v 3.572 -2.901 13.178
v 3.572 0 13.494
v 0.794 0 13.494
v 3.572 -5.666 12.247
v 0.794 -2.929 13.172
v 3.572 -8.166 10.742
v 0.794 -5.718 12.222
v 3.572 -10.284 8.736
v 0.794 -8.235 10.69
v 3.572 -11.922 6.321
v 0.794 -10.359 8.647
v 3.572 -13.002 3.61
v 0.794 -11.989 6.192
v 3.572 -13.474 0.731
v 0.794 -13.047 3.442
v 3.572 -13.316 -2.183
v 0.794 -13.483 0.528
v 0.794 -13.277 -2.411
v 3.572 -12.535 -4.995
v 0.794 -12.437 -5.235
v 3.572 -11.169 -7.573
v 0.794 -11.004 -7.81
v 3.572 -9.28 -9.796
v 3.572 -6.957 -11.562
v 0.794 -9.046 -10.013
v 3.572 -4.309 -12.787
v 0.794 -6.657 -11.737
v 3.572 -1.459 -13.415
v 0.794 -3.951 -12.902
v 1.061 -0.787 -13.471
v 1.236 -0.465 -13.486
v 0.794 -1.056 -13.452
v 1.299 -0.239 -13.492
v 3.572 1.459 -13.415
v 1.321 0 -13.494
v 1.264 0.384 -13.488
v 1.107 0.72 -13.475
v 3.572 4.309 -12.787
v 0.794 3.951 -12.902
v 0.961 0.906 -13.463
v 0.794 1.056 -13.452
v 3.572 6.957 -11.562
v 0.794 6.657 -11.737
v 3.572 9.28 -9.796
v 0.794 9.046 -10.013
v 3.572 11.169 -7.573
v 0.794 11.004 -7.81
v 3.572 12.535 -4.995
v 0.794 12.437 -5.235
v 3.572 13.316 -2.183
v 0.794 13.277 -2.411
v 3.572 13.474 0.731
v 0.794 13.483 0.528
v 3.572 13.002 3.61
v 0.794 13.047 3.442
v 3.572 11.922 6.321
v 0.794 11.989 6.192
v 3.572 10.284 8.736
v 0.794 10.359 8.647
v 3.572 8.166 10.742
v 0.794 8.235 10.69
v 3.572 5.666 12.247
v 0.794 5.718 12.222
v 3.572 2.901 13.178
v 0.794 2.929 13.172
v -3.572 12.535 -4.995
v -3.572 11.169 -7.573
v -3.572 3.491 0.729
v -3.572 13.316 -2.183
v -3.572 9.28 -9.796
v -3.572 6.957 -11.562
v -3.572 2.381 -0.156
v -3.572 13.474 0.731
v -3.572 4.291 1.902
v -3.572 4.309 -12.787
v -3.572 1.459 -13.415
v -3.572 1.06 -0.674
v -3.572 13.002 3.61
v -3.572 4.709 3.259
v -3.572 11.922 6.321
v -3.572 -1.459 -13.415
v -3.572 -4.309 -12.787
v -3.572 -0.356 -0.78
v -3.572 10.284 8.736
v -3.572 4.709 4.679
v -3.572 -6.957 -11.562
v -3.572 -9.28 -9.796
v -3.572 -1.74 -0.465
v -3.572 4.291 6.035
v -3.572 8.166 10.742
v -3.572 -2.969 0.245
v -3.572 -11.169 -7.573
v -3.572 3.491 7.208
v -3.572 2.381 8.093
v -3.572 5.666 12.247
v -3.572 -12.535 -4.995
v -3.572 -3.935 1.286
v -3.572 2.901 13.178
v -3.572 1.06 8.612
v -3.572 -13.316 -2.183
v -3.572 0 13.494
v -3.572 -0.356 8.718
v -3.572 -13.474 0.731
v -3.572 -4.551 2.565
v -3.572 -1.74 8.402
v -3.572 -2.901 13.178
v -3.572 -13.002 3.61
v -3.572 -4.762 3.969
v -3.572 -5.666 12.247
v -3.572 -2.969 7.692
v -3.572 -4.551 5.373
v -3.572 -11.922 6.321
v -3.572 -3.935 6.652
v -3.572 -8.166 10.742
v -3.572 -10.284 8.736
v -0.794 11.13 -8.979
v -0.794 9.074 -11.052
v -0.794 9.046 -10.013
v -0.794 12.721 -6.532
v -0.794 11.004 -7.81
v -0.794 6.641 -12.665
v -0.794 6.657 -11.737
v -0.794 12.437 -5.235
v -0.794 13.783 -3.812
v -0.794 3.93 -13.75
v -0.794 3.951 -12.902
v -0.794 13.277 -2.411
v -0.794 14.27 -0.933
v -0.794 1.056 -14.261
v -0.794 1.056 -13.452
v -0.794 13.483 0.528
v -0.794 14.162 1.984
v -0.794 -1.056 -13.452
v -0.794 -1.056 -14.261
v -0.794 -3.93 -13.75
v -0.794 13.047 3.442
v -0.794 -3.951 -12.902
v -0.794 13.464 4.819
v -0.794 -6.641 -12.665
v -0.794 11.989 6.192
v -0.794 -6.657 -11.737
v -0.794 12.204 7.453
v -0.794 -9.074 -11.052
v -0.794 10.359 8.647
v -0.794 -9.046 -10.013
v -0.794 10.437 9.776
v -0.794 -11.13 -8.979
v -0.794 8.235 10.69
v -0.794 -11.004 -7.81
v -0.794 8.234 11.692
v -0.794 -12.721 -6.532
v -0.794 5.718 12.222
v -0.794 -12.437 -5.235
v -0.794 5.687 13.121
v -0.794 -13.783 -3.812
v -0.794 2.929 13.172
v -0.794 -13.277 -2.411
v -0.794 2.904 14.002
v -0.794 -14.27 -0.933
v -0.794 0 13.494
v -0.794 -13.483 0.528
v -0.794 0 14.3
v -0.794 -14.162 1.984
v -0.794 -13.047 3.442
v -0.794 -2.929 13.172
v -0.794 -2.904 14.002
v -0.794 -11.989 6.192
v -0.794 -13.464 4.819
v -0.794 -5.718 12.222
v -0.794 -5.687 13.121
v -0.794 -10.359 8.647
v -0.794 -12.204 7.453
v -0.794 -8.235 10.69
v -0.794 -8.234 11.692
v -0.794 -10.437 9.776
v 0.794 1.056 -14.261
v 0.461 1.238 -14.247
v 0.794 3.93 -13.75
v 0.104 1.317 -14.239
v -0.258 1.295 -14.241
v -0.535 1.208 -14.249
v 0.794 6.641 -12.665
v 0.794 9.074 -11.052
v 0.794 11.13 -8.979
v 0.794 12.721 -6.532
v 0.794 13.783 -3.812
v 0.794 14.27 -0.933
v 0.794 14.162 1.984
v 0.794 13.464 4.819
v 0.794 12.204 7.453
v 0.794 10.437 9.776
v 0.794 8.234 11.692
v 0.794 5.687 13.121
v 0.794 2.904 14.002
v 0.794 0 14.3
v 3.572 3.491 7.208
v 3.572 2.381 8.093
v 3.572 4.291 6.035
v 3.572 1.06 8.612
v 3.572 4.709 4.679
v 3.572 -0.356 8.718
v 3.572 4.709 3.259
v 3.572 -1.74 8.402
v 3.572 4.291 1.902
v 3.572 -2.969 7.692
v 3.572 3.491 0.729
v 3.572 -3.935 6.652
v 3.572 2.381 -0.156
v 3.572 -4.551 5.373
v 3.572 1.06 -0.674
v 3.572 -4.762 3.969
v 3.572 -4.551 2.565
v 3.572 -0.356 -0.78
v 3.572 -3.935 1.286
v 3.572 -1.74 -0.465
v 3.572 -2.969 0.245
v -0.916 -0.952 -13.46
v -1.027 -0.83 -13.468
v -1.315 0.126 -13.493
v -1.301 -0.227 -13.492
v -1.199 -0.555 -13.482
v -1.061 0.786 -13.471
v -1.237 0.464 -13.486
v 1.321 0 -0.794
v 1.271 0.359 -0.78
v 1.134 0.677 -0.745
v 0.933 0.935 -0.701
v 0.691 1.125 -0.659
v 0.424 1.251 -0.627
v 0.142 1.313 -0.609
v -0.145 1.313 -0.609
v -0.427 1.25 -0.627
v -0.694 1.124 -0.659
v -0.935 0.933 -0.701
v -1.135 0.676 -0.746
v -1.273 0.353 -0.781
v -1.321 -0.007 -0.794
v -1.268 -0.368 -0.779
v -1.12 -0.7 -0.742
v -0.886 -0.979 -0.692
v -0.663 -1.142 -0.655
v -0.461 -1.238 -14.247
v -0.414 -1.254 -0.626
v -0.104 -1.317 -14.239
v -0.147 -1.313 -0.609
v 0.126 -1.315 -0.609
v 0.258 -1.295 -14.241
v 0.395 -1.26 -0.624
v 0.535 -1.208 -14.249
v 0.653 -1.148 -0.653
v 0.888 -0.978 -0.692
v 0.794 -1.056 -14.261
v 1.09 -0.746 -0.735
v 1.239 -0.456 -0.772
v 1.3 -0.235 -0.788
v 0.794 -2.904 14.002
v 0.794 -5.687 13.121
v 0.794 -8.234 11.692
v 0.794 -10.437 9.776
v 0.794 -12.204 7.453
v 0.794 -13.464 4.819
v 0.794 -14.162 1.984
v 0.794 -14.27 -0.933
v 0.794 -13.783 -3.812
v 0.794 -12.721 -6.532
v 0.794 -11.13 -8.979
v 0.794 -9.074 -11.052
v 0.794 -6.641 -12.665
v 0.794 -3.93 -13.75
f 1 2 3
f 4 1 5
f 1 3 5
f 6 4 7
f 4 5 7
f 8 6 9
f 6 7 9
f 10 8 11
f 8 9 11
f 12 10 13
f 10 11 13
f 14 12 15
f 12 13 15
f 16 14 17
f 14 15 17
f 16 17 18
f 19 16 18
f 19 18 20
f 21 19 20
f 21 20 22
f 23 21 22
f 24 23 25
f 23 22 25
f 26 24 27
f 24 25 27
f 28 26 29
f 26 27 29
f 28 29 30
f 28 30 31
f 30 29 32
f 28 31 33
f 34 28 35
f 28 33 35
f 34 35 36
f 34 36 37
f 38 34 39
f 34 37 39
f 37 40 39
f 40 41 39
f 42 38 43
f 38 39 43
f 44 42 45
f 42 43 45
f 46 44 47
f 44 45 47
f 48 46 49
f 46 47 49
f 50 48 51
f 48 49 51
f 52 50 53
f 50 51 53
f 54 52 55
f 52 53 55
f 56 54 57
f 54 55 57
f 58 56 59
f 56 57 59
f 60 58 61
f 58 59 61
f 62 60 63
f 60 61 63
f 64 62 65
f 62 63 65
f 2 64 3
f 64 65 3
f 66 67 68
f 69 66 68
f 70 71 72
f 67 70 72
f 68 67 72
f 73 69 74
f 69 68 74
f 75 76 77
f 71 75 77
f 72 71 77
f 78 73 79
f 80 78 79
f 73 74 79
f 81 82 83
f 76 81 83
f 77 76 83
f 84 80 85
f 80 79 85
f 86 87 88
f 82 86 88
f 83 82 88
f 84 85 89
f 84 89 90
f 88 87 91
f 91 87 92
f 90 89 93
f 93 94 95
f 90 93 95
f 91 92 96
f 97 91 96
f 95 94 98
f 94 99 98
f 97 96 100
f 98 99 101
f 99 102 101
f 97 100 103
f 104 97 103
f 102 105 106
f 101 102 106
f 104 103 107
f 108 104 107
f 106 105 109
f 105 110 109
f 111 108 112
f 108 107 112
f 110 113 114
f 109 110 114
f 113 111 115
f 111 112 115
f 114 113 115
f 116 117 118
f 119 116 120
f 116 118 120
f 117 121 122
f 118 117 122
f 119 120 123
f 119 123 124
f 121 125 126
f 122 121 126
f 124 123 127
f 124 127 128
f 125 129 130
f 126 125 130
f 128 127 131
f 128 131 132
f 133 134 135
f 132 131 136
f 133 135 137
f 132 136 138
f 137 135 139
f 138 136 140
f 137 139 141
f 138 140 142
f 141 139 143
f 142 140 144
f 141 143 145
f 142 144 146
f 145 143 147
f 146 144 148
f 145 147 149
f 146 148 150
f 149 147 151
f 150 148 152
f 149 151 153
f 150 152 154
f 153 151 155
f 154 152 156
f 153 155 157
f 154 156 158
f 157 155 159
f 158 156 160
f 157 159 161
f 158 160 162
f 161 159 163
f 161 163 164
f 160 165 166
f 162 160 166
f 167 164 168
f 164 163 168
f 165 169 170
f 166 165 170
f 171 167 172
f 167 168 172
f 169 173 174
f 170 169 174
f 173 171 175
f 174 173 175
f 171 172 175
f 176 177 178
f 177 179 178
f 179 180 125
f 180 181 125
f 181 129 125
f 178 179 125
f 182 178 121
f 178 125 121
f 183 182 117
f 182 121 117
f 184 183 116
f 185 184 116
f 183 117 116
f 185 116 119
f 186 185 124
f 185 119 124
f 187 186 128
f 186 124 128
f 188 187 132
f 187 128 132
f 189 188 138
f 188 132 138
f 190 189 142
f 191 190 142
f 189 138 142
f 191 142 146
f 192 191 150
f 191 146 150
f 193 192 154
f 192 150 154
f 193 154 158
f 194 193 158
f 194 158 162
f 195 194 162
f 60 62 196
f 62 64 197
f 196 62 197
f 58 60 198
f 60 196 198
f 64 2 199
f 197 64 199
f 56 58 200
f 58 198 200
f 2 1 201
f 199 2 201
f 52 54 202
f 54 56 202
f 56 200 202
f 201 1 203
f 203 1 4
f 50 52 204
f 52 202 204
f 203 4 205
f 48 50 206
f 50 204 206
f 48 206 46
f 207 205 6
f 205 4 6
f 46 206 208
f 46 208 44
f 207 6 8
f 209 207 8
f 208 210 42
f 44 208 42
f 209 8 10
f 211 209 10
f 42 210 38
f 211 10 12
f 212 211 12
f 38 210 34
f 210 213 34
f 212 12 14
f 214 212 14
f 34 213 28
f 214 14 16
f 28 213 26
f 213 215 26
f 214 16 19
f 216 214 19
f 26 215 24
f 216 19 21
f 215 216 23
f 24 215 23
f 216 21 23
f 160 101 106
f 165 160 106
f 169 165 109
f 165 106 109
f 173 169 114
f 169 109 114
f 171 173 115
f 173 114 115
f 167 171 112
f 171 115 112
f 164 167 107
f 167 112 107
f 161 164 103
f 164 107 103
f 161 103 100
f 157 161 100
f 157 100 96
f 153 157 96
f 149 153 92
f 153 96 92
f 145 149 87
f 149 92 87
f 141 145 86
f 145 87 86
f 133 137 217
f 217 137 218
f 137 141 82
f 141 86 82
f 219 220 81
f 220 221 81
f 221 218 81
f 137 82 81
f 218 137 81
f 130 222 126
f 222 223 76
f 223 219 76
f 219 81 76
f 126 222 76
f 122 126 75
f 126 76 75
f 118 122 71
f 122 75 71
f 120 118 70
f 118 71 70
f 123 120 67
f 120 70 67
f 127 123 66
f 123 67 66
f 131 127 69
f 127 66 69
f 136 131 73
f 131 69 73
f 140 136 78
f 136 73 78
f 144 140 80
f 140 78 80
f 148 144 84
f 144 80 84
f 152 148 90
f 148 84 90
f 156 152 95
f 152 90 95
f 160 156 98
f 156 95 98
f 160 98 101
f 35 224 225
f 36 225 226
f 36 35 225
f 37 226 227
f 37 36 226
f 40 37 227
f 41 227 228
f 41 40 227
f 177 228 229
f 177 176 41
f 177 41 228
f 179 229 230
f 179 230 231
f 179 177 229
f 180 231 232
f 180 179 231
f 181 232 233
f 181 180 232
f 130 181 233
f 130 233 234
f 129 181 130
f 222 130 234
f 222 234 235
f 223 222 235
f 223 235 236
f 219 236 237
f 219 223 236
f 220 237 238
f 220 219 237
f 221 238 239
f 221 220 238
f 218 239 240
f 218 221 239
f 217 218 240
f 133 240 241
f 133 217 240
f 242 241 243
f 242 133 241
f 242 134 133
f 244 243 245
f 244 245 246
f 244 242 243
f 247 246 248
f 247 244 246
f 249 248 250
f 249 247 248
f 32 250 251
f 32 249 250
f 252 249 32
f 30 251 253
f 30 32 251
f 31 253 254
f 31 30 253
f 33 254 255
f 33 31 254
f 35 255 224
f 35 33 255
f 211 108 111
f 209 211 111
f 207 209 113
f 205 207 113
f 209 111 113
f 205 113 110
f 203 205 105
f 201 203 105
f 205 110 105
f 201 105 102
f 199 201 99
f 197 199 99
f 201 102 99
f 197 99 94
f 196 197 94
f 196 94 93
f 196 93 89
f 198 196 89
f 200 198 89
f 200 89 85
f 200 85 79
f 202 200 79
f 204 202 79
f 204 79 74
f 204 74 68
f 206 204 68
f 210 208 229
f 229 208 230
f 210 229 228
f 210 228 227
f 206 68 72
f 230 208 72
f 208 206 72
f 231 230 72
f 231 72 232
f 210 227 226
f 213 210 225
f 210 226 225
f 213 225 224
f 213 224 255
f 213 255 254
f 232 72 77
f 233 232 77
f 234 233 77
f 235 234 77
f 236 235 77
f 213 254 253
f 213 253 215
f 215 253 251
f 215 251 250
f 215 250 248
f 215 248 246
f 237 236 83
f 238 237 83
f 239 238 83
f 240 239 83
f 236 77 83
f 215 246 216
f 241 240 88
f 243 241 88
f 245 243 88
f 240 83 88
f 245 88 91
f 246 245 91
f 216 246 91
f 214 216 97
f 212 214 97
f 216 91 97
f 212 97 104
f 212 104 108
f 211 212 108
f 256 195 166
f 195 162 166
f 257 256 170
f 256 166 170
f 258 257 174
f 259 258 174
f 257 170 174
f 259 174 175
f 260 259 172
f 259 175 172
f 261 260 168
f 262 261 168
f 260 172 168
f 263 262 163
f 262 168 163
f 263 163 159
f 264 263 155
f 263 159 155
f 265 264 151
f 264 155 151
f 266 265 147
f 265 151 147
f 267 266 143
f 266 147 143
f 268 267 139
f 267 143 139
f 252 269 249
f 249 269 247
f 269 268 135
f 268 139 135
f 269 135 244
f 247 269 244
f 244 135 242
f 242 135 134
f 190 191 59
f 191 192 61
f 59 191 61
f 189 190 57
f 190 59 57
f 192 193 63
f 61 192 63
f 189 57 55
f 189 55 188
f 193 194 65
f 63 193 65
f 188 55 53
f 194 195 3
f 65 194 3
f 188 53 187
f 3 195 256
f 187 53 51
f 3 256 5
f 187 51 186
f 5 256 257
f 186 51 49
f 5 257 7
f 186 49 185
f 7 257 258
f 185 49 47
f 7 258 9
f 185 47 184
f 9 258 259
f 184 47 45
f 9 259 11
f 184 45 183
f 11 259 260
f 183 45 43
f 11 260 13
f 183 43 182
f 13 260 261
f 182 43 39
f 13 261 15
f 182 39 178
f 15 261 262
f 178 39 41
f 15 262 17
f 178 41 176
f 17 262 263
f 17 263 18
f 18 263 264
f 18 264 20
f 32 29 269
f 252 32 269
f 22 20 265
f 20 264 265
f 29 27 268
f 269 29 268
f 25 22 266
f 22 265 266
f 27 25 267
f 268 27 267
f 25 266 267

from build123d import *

# Parameters (mm, degrees)
F2_R     = 4.7625
F3_DEPTH = 7.14475
F5_R     = 1.3208
F6_DEPTH = 14.2875


with BuildPart() as f1:
    # F0 (on Front) → F1 (revolve)
    with BuildSketch(Plane.XZ):
        Polygon((-3.571875, 13.49375), (-3.571875, 0), (3.571875, 0), (3.571875, 13.49375), (0.79375, 13.49375), (0.79375, 14.3002), (-0.79375, 14.3002), (-0.79375, 13.49375), align=None)
    revolve(axis=Axis((0, 0, 0), (1, 0, 0)))

    # F2 (on face) → F3 (cut, through all)
    with BuildSketch(Plane(origin=(-3.571875, 0, 0), x_dir=(0, -1, 0), z_dir=(-1, 0, 0))):
        with Locations((0, 3.96875)):
            Circle(F2_R)
    extrude(amount=-F3_DEPTH, mode=Mode.SUBTRACT)

    # F5 (on offset) → F6 (cut)
    with BuildSketch(Plane.XY.offset(-14.478)):
        Circle(F5_R)
    extrude(amount=F6_DEPTH, mode=Mode.SUBTRACT)


solid = f1.part
